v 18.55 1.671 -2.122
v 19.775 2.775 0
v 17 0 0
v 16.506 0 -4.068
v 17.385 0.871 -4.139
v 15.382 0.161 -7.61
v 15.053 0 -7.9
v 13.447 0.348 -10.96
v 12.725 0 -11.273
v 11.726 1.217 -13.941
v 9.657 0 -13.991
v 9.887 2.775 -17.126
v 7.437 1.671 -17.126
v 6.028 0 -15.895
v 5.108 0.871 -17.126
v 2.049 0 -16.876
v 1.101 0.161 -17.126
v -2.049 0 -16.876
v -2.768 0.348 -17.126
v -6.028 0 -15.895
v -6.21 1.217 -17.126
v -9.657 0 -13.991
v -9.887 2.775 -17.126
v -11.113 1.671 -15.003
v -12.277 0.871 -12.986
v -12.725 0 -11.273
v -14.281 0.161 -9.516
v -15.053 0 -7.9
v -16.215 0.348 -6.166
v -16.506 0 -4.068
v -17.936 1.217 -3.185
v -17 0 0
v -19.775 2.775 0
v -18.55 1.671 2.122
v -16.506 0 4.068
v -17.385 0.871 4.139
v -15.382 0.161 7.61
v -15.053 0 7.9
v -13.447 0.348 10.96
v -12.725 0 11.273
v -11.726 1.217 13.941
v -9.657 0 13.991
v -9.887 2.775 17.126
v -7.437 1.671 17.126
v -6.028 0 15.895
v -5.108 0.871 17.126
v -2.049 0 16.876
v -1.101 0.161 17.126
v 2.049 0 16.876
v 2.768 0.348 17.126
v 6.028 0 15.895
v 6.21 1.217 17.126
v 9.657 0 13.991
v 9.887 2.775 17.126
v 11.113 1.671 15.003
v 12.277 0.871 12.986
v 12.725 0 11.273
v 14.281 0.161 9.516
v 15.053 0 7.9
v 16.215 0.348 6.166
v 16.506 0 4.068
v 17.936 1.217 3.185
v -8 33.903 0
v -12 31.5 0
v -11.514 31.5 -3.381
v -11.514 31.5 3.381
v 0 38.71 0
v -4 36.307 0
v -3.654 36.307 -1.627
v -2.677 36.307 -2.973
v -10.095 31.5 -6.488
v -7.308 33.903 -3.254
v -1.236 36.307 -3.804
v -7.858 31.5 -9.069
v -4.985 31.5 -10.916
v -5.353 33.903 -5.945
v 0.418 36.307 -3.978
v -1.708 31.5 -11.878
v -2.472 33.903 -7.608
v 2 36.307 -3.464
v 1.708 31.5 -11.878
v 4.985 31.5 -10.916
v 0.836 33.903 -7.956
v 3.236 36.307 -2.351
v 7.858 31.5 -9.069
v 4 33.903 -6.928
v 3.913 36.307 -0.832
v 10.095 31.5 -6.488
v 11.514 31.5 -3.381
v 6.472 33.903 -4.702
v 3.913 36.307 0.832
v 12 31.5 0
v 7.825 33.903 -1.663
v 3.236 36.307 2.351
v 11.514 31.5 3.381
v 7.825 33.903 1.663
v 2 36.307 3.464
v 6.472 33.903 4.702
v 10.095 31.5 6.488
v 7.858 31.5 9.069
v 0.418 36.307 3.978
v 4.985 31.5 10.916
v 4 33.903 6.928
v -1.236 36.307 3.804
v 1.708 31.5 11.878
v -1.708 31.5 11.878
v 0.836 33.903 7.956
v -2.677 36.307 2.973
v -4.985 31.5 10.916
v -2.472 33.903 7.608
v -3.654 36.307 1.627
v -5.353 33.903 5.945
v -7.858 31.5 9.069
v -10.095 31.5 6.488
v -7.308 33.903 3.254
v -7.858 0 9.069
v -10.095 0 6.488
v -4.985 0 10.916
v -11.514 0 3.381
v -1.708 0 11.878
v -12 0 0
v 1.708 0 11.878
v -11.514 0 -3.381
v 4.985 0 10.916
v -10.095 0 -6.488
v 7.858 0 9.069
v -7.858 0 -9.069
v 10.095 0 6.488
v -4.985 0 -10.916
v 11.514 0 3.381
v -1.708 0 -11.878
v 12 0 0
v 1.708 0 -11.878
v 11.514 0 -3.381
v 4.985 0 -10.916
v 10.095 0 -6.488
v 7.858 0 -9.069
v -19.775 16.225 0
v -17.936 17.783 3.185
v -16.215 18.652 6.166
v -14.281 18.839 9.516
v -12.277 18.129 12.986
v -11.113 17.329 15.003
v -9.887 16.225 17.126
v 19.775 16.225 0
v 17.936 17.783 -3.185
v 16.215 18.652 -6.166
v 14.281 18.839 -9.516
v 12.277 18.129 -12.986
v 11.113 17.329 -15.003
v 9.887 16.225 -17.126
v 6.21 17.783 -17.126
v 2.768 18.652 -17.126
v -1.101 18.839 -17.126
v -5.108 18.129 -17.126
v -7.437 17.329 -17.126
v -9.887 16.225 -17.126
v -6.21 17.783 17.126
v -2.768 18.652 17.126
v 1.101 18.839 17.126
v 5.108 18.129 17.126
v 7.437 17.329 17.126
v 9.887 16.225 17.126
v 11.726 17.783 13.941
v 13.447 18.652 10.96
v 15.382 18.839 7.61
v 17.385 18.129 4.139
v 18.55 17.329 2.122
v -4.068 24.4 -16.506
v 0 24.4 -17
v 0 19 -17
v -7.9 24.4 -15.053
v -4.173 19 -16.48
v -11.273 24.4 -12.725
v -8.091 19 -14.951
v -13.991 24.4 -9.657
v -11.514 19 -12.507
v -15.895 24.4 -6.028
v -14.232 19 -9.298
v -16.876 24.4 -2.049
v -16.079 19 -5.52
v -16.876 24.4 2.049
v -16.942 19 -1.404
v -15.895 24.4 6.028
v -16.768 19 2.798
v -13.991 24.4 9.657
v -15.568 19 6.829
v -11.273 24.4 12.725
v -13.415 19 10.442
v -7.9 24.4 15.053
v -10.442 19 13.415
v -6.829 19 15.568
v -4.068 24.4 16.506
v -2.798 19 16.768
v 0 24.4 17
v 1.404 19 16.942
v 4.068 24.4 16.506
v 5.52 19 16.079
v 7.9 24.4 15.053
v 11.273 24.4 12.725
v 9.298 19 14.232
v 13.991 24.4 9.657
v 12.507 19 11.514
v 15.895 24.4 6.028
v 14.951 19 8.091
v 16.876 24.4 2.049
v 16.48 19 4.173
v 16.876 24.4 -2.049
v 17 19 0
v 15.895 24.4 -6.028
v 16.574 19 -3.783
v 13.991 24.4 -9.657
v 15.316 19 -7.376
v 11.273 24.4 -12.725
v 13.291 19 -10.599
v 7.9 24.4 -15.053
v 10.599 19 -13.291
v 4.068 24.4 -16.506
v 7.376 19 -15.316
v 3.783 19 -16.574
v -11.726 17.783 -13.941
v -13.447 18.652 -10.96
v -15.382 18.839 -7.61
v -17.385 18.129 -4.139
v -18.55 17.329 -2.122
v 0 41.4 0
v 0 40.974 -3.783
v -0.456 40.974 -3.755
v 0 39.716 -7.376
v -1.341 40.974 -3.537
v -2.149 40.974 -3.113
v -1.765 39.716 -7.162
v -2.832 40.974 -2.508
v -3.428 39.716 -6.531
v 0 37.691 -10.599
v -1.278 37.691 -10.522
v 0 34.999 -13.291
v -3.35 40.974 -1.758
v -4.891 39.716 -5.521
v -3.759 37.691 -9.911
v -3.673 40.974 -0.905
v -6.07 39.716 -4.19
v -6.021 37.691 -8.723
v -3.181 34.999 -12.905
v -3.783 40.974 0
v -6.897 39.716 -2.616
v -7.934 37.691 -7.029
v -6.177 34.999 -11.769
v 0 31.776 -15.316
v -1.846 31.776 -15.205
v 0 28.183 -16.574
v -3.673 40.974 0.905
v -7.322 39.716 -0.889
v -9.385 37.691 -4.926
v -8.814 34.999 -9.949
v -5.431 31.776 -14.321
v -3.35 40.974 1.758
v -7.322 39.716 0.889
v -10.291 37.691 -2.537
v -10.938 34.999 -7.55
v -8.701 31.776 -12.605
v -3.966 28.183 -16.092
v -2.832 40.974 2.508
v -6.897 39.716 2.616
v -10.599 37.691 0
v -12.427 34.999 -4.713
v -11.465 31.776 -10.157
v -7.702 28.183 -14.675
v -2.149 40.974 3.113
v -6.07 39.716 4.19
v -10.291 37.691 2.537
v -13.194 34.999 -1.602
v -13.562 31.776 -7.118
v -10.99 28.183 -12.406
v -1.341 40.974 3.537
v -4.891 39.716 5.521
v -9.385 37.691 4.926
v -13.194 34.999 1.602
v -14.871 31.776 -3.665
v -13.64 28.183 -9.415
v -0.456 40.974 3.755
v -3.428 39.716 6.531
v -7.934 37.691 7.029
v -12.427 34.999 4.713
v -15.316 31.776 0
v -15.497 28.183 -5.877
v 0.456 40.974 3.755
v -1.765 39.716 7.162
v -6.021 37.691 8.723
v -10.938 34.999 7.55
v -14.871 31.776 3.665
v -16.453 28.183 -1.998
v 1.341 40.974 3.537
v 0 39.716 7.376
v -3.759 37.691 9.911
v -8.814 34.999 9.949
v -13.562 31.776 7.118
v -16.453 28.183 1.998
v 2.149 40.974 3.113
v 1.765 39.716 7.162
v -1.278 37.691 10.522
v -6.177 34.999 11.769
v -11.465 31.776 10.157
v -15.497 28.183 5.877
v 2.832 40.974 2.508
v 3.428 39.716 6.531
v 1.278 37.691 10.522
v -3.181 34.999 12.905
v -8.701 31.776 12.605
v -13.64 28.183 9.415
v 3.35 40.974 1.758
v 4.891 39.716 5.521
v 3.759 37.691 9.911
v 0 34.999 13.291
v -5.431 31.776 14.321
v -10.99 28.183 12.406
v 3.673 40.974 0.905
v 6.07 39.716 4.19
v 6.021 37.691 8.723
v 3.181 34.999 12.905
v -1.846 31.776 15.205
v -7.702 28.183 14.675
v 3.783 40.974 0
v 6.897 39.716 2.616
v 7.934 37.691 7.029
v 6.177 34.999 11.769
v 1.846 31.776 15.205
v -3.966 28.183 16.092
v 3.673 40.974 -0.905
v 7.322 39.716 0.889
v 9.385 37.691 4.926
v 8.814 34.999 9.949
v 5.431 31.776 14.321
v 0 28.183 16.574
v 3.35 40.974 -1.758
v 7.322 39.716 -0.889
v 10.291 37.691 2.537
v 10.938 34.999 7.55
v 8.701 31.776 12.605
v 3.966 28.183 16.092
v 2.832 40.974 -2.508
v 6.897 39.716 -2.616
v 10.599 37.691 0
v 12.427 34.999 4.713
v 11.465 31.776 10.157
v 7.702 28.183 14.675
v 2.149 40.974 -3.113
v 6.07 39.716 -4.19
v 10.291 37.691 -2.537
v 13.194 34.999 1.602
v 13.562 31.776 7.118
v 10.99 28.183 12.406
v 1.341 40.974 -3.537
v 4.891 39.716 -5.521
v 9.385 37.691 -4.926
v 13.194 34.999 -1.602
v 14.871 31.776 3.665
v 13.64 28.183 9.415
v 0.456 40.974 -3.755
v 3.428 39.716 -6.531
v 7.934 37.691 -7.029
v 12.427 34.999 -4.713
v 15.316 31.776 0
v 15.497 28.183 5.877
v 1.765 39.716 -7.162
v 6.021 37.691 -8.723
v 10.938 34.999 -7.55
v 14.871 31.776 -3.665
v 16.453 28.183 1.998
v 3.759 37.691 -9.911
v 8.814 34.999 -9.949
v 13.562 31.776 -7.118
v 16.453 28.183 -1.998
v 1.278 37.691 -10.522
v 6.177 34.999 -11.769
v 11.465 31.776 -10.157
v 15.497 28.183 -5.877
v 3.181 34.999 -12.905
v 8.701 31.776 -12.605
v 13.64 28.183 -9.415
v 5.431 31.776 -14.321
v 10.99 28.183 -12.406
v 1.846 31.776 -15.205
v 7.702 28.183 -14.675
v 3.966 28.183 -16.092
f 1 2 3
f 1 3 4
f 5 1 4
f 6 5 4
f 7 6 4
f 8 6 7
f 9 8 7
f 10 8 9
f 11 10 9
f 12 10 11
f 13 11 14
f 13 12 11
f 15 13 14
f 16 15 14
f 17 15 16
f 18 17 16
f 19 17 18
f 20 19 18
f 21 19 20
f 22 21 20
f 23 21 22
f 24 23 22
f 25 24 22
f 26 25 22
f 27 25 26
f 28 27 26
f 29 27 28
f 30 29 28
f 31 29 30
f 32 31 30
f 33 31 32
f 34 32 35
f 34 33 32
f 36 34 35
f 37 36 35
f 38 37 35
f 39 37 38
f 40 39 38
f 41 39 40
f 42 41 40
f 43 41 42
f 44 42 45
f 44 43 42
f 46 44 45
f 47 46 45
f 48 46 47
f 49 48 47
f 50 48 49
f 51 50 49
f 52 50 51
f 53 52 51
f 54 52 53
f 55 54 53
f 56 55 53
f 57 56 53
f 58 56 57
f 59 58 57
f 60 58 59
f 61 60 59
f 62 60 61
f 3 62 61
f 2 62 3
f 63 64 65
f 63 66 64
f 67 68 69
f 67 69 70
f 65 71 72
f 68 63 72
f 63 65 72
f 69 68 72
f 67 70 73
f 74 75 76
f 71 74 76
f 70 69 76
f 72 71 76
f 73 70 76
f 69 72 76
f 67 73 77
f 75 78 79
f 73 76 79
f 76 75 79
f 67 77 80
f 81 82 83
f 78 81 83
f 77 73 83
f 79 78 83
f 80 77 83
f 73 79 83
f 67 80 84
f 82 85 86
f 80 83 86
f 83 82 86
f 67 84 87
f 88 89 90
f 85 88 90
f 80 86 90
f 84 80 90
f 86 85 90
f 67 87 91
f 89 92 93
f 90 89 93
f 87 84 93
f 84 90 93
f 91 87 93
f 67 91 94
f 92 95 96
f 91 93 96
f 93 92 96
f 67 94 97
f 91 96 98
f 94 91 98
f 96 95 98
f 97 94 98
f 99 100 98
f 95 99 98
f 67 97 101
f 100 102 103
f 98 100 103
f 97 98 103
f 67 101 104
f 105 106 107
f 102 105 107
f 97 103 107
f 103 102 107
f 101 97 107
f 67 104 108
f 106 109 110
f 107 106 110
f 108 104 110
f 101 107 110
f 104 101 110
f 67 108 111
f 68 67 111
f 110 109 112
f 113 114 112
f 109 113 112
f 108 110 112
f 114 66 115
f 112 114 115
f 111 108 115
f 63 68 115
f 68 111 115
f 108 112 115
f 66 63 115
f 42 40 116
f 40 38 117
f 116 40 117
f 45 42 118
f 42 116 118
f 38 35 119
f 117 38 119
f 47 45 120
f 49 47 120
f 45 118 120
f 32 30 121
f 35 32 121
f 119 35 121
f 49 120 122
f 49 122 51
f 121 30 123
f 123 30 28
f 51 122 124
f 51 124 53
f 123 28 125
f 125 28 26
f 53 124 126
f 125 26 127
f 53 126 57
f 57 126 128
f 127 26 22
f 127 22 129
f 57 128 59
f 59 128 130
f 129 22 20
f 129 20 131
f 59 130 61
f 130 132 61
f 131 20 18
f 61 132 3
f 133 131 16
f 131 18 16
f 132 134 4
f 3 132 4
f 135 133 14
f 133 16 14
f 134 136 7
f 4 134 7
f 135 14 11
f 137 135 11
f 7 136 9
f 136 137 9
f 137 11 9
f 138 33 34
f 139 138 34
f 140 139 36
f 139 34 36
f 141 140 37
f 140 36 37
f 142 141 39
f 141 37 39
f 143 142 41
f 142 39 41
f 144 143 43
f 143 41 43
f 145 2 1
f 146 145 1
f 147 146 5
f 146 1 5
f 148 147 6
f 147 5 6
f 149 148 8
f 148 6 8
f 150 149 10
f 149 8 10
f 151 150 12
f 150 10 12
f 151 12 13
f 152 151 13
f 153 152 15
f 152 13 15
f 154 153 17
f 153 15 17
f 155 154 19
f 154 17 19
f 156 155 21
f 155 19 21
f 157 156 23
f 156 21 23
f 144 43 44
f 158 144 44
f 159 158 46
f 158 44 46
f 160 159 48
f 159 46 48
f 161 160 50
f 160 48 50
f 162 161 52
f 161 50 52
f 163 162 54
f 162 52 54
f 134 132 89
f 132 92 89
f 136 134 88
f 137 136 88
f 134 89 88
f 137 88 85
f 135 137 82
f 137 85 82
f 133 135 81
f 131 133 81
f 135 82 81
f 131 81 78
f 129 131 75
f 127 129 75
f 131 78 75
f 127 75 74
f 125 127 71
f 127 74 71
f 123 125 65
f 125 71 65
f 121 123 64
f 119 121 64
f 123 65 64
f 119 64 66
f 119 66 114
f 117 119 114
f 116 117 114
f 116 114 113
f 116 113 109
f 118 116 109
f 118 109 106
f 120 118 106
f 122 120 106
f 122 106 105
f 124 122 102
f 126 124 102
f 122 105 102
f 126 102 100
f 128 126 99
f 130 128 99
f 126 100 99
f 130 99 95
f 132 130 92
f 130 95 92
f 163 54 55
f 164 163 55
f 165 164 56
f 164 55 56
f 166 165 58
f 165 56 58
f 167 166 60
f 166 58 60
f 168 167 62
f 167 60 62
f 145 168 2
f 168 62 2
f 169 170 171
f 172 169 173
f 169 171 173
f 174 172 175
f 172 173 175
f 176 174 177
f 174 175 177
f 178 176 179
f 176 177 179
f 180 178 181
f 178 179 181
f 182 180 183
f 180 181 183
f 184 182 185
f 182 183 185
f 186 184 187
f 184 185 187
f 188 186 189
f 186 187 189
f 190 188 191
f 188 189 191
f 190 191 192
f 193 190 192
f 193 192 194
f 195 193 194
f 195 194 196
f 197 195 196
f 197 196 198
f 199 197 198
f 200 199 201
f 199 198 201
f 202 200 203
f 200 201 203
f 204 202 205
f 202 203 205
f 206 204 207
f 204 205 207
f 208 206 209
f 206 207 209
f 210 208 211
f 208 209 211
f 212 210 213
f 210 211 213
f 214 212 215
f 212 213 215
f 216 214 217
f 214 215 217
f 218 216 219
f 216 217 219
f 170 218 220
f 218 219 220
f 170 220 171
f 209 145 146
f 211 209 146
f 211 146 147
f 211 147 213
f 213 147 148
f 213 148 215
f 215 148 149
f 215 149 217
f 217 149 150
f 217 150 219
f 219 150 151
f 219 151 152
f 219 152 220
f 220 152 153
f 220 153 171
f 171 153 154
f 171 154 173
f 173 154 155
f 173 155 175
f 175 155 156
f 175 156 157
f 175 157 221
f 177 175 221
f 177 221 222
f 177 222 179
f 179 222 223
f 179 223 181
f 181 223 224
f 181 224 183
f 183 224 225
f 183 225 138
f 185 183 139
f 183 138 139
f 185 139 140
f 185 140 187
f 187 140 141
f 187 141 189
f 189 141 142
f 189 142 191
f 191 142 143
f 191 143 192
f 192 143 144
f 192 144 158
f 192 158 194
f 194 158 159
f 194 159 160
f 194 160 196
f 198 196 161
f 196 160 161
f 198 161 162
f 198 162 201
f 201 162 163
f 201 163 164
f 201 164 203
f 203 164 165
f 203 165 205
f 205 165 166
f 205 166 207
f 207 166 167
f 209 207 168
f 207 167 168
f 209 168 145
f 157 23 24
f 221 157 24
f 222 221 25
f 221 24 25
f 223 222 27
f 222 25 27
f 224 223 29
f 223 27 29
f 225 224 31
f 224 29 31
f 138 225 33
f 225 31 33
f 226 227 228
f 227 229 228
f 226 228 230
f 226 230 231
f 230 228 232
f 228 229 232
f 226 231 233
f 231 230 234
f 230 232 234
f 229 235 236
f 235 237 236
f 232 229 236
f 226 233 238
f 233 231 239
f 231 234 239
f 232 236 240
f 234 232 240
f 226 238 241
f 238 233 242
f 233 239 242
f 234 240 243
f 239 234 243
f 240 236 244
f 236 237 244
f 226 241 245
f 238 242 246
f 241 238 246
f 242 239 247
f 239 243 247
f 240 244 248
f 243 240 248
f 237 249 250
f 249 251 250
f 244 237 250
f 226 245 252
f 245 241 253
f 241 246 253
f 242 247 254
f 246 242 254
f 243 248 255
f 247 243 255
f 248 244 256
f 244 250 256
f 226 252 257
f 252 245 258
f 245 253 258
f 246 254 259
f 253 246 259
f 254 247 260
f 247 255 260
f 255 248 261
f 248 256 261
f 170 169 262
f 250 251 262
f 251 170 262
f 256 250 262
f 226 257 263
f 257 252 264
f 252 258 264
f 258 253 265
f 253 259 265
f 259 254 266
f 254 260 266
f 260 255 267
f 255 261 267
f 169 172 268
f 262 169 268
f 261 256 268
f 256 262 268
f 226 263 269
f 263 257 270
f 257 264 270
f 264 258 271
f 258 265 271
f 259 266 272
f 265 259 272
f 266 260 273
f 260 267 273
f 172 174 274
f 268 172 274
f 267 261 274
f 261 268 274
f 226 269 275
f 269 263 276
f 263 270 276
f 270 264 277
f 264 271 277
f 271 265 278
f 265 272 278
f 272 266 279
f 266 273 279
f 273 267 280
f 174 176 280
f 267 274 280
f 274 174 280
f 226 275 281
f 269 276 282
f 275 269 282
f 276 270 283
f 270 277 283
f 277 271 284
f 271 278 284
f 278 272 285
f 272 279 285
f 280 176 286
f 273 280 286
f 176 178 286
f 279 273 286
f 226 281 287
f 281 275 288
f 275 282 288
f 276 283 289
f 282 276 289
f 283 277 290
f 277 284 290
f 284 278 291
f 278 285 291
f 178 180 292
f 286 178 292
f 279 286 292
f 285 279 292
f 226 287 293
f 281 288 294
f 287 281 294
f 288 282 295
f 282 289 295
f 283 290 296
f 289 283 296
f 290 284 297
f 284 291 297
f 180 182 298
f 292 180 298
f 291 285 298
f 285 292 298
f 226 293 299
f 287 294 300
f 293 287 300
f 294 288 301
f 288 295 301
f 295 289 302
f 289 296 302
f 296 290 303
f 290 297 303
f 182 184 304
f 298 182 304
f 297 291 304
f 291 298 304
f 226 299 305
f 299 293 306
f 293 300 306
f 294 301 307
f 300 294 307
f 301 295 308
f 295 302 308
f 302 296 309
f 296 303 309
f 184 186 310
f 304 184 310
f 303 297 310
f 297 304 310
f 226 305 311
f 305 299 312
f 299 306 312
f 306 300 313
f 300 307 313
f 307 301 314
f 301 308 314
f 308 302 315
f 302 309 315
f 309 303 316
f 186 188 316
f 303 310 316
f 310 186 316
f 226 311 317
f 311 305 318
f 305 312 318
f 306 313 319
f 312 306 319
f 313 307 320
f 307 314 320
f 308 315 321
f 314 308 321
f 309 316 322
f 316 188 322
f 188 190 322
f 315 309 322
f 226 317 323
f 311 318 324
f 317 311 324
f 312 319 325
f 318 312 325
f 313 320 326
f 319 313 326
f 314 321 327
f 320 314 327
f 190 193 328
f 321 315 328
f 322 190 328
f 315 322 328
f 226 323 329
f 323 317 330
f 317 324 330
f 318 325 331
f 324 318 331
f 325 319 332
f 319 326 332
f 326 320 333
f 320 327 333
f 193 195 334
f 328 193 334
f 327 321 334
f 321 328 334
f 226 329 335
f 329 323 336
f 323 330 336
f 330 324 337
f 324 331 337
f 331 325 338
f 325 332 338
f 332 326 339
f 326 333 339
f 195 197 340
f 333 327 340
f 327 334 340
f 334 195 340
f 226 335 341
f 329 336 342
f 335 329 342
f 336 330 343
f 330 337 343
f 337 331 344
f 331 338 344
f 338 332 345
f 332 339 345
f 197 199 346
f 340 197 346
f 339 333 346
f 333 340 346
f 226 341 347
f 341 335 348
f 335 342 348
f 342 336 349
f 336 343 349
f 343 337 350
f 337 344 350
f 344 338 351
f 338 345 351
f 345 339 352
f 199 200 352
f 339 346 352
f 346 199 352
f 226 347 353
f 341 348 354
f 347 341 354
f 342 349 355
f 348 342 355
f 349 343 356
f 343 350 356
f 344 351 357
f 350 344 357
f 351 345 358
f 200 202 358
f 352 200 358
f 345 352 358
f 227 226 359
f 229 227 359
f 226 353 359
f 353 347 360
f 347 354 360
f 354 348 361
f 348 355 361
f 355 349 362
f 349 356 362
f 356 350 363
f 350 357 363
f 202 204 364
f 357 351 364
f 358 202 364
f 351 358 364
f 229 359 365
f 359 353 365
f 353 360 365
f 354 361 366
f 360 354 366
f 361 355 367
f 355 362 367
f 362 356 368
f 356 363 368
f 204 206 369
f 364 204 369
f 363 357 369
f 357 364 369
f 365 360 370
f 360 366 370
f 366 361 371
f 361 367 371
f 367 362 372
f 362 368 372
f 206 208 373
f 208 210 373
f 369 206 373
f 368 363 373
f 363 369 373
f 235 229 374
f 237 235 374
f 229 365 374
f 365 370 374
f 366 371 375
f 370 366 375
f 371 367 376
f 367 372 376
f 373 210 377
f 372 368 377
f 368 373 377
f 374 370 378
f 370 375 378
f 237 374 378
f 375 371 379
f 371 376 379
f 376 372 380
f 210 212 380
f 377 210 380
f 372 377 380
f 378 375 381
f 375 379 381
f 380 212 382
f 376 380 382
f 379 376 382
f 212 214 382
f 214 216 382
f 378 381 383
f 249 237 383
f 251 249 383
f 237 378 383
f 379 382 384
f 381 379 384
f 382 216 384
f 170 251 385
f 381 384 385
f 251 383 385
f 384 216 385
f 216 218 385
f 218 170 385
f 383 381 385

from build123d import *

# Parameters (mm, degrees)
BOSS_EXTRUDE1_DEPTH        = 19
F_20_0MM_DOWEL_HOLE1_D     = 24
F_20_0MM_DOWEL_HOLE1_DEPTH = 31.5
F_20_0MM_DOWEL_HOLE1_TIP   = 7.210327428


with BuildPart() as part:
    # Sketch1 → Boss-Extrude1 (new body)
    with BuildSketch(Plane(origin=(0, 0, 0), x_dir=(1, 0, 0), z_dir=(0, 1, 0))):
        Polygon((19.775, 0), (9.8875, 17.12565236), (-9.8875, 17.12565236), (-19.775, 0), (-9.8875, -17.12565236), (9.8875, -17.12565236), align=None)
    extrude(amount=BOSS_EXTRUDE1_DEPTH)

    # Sketch2 → Revolve1 (revolve)
    with BuildSketch(Plane.ZY):
        with BuildLine():
            Line((-17, 24.4), (-17, 19))
            Line((-17, 19), (0, 19))
            Line((0, 19), (0, 41.4))
            ThreePointArc((0, 41.4), (-12.02081528, 36.42081528), (-17, 24.4))
        make_face()
    revolve(axis=Axis((0, -1000, 0), (0, 1, 0)))

    # Ø20.0mm Dowel Hole1
    with Locations(Plane(origin=(0, 0, 0), x_dir=(-1, 0, 0), z_dir=(0, -1, 0))):
        with Locations((0, 0)):
            Hole(F_20_0MM_DOWEL_HOLE1_D / 2, depth=F_20_0MM_DOWEL_HOLE1_DEPTH)
            with Locations((0, 0, -(F_20_0MM_DOWEL_HOLE1_DEPTH + F_20_0MM_DOWEL_HOLE1_TIP / 2))):  # 118° drill point
                Cone(0, F_20_0MM_DOWEL_HOLE1_D / 2, F_20_0MM_DOWEL_HOLE1_TIP, mode=Mode.SUBTRACT)

    # Sketch6 → Cut-Revolve1 (revolve, cut)
    with BuildSketch(Plane.XY):
        Polygon((19.775, 19), (17, 19), (19.775, 16.225), align=None)
        Polygon((19.775, 2.775), (19.775, 0), (17, 0), align=None)
    revolve(axis=Axis((0, -1000, 0), (0, 1, 0)), mode=Mode.SUBTRACT)


solid = part.part
